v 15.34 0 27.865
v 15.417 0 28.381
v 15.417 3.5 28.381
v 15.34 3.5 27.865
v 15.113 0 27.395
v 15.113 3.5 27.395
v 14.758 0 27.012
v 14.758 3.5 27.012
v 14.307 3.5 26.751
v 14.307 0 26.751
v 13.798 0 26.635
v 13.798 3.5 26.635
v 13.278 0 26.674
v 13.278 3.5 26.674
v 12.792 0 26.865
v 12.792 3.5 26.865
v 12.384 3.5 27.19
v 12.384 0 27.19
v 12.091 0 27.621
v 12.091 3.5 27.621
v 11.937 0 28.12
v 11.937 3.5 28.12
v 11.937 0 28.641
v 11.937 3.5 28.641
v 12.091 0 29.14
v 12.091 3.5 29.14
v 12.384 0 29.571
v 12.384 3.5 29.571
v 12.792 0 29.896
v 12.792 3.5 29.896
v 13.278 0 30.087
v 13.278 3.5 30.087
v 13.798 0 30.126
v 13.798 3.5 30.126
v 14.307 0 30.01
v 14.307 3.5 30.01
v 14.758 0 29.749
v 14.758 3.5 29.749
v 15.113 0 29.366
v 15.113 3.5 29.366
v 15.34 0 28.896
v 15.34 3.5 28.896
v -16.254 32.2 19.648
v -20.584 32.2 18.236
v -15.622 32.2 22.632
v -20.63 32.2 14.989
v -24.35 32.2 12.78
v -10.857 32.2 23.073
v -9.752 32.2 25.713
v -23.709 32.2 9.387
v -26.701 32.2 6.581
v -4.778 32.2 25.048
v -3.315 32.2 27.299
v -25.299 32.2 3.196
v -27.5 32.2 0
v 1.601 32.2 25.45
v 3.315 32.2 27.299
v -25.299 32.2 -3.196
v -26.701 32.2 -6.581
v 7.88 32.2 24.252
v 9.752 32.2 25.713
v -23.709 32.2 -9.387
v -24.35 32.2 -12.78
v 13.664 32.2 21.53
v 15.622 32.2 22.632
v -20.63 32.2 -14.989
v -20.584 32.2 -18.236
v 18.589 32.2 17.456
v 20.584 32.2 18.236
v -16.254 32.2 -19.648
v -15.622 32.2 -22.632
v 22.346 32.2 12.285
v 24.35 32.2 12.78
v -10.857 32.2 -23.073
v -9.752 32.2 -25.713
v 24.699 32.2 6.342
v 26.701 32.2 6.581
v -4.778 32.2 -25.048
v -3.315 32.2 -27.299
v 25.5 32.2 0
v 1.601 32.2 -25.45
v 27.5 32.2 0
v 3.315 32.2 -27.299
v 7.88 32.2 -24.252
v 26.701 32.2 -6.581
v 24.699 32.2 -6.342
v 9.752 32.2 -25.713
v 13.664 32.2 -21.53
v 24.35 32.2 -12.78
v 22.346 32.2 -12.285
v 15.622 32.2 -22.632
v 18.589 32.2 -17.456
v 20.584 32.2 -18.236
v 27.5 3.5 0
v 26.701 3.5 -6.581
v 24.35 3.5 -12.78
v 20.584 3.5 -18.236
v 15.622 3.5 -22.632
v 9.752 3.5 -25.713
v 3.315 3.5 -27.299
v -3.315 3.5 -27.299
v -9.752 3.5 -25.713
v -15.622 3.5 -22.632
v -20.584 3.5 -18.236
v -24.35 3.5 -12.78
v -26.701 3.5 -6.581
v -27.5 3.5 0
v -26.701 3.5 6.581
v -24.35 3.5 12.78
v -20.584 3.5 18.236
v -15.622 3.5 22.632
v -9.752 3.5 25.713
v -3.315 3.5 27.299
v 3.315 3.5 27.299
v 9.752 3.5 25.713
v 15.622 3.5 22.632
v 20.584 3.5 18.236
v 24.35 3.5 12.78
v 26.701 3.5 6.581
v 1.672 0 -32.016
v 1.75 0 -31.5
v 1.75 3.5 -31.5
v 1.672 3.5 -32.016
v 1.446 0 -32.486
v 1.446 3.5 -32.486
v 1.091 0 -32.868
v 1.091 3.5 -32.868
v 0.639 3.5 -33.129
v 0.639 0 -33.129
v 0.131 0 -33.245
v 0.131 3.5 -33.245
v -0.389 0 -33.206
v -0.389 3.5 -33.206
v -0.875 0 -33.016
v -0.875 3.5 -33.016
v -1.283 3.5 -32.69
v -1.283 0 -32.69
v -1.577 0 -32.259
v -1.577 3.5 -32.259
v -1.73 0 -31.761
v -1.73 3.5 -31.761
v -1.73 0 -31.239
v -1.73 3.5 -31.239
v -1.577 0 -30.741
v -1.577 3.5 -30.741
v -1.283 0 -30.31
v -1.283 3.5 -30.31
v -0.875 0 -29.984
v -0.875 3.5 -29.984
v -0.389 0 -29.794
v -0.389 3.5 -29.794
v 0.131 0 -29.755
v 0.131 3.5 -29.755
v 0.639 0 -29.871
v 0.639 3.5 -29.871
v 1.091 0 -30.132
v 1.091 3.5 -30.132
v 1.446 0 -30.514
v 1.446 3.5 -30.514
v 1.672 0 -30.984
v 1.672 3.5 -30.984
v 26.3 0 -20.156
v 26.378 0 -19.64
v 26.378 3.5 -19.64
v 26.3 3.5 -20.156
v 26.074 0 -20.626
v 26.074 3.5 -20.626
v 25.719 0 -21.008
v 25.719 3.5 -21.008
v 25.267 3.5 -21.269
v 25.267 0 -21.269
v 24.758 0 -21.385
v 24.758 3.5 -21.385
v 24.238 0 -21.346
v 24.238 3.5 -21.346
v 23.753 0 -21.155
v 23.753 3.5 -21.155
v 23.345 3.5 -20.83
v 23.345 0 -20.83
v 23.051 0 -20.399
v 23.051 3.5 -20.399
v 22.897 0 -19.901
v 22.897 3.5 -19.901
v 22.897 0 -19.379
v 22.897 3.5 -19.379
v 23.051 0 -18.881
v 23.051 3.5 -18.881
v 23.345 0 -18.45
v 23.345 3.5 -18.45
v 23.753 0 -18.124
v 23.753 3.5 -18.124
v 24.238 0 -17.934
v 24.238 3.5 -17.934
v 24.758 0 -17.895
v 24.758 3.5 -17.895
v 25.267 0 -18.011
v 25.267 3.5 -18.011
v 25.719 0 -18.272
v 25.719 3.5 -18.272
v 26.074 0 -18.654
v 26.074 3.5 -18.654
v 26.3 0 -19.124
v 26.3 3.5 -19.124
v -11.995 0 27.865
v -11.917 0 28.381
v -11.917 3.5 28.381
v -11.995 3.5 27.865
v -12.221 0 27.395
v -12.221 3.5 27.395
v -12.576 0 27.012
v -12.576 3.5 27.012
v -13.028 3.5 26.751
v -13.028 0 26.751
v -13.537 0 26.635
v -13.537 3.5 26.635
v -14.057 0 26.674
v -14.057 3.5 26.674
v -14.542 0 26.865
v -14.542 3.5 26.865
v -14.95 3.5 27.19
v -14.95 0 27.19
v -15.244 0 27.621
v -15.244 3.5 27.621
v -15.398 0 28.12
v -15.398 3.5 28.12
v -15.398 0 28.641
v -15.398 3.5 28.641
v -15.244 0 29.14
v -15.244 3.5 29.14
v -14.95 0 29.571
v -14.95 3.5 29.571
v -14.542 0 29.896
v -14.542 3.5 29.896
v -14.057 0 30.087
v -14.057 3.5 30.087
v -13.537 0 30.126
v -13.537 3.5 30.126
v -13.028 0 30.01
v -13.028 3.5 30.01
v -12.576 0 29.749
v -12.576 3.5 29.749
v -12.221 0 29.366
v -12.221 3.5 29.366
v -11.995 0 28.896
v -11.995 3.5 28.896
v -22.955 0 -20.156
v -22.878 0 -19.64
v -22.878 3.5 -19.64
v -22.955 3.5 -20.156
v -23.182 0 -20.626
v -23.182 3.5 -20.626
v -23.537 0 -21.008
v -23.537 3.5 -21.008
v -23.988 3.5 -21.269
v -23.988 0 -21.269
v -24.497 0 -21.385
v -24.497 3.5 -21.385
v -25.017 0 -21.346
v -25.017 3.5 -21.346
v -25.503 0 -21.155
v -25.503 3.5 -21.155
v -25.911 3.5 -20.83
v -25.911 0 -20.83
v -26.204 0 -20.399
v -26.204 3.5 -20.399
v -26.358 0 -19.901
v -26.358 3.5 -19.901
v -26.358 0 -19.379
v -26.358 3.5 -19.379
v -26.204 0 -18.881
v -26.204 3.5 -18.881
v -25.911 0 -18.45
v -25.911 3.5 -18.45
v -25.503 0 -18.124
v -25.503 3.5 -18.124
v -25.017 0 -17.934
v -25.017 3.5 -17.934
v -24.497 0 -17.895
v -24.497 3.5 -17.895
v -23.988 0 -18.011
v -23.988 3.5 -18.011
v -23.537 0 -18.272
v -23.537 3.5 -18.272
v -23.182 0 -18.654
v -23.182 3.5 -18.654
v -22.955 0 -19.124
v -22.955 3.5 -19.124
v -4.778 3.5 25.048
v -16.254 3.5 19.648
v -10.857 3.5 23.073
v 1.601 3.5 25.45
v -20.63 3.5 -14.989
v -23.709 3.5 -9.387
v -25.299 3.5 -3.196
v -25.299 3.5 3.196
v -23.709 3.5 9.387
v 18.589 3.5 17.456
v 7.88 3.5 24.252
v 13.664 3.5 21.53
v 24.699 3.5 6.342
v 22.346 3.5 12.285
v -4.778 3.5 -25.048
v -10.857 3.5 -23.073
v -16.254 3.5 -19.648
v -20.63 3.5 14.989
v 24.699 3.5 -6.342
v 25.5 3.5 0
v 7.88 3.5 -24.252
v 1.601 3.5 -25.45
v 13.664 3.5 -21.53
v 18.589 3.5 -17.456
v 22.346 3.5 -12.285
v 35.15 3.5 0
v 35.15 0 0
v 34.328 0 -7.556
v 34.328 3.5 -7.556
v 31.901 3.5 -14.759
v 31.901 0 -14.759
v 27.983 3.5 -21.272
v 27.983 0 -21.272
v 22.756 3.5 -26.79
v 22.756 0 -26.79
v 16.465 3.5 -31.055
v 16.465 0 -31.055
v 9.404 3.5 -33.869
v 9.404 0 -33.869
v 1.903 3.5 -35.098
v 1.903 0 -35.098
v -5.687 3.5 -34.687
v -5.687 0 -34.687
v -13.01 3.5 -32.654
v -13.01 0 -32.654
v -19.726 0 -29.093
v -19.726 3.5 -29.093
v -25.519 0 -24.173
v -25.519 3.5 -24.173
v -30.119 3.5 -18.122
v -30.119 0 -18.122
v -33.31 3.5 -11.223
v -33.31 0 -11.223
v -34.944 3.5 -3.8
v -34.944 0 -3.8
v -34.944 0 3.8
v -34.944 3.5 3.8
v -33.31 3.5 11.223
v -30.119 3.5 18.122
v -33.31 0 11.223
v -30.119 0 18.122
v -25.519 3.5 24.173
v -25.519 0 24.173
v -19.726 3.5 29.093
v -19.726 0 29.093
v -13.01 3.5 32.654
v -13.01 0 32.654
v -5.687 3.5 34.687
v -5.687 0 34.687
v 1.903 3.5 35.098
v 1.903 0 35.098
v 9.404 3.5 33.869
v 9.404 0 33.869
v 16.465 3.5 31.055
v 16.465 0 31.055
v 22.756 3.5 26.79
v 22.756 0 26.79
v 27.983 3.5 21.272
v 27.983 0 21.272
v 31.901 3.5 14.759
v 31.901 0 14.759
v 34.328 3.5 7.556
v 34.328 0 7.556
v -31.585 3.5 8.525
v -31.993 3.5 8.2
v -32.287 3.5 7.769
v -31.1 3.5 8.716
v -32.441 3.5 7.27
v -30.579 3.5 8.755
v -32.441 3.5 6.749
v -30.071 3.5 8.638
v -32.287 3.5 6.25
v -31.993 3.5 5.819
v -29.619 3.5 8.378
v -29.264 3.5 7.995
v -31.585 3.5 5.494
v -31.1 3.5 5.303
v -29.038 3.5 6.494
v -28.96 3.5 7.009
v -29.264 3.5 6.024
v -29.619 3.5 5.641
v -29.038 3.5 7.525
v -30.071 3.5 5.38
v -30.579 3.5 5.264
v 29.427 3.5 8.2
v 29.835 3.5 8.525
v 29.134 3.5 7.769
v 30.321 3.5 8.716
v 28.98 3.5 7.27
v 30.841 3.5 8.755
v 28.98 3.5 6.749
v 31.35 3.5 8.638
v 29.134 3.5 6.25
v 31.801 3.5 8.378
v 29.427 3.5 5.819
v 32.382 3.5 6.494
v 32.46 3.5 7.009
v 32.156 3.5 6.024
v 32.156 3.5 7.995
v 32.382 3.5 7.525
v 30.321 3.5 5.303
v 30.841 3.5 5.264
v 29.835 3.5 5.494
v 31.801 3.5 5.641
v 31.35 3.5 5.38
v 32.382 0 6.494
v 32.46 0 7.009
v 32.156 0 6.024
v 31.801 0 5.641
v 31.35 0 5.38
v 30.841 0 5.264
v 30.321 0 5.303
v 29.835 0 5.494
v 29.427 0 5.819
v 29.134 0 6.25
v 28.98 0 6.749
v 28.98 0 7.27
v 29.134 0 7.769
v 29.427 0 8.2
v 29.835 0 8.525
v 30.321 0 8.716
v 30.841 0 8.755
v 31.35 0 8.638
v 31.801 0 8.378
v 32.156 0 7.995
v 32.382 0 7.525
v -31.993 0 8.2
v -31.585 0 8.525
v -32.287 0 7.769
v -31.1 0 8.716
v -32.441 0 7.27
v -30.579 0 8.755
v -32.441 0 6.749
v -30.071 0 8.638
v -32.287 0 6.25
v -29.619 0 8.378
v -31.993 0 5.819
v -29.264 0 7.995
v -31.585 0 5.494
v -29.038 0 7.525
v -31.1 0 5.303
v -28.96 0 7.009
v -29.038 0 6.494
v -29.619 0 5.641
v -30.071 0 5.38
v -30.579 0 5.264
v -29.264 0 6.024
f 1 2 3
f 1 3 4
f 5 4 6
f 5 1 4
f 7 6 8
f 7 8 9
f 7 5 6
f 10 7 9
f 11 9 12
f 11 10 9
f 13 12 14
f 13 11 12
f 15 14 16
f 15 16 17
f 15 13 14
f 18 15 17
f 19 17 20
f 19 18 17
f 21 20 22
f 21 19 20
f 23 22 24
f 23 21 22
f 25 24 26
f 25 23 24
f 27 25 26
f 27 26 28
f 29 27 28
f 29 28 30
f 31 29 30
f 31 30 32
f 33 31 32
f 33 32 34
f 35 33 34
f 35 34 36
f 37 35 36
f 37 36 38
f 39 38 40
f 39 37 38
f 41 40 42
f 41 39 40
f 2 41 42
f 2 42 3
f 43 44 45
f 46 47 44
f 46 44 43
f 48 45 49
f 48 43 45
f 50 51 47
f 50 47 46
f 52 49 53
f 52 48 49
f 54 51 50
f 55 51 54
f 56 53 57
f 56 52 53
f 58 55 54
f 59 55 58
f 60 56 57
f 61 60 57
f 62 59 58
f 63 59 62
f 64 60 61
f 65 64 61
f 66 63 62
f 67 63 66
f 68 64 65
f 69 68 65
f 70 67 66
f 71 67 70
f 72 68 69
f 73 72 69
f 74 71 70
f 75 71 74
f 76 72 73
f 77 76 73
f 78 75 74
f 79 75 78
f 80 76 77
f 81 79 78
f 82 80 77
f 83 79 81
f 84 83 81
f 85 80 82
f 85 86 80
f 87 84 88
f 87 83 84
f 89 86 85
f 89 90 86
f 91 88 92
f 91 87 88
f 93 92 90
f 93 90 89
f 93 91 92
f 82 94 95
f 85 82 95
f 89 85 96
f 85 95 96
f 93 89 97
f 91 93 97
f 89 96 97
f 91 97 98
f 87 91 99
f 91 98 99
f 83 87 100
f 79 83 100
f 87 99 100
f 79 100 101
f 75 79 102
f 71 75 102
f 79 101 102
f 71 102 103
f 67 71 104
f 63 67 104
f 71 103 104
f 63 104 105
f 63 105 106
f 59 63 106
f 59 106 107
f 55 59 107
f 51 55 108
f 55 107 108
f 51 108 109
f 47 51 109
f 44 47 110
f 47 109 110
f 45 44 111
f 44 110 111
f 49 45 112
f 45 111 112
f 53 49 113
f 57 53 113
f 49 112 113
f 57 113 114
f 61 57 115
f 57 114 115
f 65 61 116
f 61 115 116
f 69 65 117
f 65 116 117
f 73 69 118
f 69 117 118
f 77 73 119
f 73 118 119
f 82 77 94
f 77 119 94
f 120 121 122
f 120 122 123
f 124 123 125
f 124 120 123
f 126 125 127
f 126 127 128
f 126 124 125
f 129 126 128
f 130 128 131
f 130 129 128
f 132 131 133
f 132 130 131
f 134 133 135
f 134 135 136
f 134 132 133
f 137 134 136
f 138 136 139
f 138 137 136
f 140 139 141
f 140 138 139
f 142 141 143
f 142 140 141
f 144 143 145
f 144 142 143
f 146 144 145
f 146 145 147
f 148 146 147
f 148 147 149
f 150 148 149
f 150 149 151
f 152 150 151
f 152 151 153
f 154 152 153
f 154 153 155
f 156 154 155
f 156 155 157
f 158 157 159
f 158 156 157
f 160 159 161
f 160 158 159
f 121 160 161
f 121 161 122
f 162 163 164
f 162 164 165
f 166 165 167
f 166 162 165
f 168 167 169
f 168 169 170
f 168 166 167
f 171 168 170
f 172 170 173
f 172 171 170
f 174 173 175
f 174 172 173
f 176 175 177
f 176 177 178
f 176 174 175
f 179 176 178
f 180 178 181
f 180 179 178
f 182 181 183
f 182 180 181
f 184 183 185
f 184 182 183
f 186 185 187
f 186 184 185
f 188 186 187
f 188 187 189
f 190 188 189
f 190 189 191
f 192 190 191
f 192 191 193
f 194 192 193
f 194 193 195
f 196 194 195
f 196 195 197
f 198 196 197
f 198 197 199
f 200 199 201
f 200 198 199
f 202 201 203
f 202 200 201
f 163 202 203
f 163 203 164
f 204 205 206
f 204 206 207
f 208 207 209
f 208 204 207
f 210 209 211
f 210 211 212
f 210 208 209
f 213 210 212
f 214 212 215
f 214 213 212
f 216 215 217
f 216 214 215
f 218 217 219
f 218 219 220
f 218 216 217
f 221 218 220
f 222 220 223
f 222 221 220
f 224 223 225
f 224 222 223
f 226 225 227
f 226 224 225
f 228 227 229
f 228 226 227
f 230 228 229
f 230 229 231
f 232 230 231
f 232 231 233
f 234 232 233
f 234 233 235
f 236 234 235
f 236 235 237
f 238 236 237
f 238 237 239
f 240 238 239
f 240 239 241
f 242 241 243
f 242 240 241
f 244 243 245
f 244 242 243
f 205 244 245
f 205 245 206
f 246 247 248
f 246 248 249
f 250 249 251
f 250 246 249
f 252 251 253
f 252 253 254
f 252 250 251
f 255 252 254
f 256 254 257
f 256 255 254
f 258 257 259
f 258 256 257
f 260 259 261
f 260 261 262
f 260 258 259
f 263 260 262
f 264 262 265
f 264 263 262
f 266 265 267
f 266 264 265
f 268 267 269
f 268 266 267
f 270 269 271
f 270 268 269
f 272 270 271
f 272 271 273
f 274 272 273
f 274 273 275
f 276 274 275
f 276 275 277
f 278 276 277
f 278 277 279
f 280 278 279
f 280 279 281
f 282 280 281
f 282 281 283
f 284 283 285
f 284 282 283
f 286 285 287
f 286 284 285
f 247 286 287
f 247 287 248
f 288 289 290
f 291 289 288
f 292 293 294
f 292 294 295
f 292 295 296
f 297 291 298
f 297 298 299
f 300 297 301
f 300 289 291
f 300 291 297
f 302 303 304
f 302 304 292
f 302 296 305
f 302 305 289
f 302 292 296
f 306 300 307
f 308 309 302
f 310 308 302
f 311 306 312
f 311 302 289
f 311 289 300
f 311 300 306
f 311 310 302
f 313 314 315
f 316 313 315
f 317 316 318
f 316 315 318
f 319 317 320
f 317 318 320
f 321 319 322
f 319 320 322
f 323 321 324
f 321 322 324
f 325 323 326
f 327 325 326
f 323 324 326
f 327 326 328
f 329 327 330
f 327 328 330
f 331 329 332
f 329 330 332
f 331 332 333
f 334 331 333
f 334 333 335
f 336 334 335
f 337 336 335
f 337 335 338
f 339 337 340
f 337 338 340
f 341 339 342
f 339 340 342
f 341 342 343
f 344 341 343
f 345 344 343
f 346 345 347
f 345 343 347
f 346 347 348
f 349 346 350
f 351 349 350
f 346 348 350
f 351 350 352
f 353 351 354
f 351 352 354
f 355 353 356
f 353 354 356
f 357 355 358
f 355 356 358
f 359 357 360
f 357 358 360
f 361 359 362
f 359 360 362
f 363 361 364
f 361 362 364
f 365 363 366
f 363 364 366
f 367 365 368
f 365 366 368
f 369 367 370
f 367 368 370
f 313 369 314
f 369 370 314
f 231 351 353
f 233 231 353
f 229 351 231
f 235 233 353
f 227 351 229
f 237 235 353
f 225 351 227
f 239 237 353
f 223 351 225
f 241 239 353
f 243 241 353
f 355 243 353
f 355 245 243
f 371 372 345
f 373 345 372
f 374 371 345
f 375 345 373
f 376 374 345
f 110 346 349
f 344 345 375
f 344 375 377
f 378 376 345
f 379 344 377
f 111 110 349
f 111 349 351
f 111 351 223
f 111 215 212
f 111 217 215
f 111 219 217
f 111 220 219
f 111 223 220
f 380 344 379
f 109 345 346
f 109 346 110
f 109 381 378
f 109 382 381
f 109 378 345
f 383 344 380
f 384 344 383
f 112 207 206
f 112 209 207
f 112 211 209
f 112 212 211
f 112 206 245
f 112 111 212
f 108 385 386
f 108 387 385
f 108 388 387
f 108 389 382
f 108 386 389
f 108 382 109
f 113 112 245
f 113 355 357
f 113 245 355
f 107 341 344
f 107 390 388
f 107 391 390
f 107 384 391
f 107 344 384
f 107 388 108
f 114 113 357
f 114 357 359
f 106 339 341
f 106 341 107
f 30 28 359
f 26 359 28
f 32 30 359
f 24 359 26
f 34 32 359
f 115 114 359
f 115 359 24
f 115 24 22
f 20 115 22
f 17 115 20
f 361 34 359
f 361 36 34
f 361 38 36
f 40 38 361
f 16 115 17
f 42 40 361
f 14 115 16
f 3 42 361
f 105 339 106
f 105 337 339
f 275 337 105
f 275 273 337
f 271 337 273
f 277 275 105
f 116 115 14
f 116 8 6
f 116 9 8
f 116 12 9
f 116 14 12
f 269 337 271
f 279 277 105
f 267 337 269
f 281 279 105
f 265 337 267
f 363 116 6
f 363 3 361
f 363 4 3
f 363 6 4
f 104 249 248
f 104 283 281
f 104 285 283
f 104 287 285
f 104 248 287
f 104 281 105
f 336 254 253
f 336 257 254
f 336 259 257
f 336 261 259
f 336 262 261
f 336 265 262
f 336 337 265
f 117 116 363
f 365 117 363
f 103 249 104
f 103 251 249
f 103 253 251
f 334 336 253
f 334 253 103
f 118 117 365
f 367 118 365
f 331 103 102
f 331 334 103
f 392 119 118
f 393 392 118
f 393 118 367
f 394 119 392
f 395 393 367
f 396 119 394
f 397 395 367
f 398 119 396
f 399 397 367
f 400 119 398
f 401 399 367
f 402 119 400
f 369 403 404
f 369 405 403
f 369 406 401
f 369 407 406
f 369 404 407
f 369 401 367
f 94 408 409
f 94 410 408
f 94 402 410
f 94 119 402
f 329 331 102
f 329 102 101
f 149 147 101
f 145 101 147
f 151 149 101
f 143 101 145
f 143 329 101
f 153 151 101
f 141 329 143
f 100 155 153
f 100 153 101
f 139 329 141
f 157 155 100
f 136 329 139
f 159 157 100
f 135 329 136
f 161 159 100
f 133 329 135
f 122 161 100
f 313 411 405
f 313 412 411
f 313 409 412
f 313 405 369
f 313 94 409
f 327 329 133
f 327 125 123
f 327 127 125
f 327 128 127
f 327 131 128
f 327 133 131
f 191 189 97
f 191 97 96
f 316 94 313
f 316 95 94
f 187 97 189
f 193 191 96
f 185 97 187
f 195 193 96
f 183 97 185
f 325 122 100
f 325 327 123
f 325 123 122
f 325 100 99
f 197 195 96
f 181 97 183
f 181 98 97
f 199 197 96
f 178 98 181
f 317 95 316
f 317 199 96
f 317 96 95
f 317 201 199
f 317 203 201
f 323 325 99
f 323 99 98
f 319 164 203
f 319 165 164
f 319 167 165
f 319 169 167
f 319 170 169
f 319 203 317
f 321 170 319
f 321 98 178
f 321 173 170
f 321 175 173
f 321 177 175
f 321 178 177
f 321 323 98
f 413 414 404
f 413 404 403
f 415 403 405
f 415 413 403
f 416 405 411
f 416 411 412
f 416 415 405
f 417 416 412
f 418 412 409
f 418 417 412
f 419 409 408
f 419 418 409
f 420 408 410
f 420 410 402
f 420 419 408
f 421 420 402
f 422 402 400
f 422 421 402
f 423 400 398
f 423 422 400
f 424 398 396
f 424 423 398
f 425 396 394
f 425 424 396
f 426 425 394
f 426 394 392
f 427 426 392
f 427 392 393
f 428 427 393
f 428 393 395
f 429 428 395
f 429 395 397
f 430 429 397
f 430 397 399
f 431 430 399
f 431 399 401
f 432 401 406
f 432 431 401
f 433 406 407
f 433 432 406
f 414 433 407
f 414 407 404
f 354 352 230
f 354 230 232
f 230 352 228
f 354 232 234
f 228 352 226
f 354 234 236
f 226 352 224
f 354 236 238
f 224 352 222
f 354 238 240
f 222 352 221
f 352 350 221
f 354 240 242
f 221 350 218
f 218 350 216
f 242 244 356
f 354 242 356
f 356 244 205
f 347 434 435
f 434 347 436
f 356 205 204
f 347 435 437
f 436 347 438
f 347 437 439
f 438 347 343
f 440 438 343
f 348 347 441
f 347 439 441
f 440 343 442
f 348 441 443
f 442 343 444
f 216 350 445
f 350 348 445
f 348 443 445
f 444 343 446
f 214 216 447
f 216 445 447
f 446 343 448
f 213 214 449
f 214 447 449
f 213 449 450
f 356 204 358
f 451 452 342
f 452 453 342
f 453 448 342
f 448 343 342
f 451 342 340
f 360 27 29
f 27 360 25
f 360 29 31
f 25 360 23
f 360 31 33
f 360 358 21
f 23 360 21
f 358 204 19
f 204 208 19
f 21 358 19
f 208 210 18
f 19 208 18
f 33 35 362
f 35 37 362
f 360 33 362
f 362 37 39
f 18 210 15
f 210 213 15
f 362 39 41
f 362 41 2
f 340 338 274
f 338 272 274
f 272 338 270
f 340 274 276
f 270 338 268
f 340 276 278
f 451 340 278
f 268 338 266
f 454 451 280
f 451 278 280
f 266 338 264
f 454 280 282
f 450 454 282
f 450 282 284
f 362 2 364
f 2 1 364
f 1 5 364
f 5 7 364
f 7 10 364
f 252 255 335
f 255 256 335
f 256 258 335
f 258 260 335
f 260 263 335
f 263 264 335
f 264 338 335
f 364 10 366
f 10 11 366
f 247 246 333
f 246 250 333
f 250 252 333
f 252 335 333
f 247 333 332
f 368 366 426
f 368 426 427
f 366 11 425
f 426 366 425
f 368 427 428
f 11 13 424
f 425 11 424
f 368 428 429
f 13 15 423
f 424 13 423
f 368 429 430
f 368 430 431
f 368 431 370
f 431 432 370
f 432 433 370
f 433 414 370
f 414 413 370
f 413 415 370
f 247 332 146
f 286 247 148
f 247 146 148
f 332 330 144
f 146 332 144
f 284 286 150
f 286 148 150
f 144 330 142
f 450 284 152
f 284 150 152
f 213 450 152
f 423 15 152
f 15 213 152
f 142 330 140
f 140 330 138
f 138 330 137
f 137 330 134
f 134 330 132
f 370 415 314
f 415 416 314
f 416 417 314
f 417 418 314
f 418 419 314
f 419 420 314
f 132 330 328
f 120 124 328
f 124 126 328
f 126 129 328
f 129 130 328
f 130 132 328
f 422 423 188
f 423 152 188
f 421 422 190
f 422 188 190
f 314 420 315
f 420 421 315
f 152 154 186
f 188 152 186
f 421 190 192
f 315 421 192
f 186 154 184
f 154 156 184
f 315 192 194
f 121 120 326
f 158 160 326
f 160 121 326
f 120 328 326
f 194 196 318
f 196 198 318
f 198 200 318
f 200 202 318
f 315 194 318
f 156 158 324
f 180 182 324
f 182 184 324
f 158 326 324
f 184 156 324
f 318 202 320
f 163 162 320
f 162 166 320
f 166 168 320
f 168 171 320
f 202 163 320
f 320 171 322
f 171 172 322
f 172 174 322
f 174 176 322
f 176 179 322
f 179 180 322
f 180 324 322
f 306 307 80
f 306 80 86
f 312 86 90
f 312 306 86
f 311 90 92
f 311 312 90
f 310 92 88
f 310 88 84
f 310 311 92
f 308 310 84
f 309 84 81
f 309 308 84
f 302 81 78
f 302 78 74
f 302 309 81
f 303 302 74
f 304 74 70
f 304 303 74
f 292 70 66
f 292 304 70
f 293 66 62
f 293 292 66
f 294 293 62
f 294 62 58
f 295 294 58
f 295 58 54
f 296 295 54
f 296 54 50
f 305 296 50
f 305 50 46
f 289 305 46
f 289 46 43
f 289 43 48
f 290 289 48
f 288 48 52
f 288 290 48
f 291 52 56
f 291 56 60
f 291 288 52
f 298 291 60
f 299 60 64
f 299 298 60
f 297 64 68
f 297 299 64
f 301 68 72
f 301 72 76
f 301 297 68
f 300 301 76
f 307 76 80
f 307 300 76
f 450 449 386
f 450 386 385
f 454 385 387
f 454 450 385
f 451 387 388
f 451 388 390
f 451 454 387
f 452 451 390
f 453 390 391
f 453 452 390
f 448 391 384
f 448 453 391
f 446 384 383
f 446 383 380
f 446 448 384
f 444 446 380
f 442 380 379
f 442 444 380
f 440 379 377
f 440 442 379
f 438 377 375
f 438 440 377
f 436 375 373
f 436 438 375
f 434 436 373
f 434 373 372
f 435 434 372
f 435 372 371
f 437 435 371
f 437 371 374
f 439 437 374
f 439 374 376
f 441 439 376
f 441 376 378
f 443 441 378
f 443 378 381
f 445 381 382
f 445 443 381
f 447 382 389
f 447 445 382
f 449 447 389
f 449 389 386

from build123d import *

# Parameters (mm, degrees)
SKETCH2_R           = 35.15
SKETCH2_R_2         = 1.75
BOSS_EXTRUDE1_DEPTH = 3.5
SKETCH3_R           = 27.5
SKETCH3_R_2         = 25.5
BOSS_EXTRUDE2_DEPTH = 28.7


with BuildPart() as part:
    # Sketch2 → Boss-Extrude1 (new body)
    with BuildSketch(Plane(origin=(0, 0, 0), x_dir=(1, 0, 0), z_dir=(0, 1, 0))):
        Circle(SKETCH2_R)
        with Locations((0, 31.5)):
            Circle(SKETCH2_R_2, mode=Mode.SUBTRACT)
        with Locations((24.627691698, 19.639928759)):
            Circle(SKETCH2_R_2, mode=Mode.SUBTRACT)
        with Locations((30.710229234, -7.00940942)):
            Circle(SKETCH2_R_2, mode=Mode.SUBTRACT)
        with Locations((13.667337782, -28.380519339)):
            Circle(SKETCH2_R_2, mode=Mode.SUBTRACT)
        with Locations((-13.667337782, -28.380519339)):
            Circle(SKETCH2_R_2, mode=Mode.SUBTRACT)
        with Locations((-30.710229234, -7.00940942)):
            Circle(SKETCH2_R_2, mode=Mode.SUBTRACT)
        with Locations((-24.627691698, 19.639928759)):
            Circle(SKETCH2_R_2, mode=Mode.SUBTRACT)
    extrude(amount=BOSS_EXTRUDE1_DEPTH)

    # Sketch3 → Boss-Extrude2 (add)
    with BuildSketch(Plane(origin=(0, 3.5, 0), x_dir=(1, 0, 0), z_dir=(0, 1, 0))):
        Circle(SKETCH3_R)
        Circle(SKETCH3_R_2, mode=Mode.SUBTRACT)
    extrude(amount=BOSS_EXTRUDE2_DEPTH)


solid = part.part
